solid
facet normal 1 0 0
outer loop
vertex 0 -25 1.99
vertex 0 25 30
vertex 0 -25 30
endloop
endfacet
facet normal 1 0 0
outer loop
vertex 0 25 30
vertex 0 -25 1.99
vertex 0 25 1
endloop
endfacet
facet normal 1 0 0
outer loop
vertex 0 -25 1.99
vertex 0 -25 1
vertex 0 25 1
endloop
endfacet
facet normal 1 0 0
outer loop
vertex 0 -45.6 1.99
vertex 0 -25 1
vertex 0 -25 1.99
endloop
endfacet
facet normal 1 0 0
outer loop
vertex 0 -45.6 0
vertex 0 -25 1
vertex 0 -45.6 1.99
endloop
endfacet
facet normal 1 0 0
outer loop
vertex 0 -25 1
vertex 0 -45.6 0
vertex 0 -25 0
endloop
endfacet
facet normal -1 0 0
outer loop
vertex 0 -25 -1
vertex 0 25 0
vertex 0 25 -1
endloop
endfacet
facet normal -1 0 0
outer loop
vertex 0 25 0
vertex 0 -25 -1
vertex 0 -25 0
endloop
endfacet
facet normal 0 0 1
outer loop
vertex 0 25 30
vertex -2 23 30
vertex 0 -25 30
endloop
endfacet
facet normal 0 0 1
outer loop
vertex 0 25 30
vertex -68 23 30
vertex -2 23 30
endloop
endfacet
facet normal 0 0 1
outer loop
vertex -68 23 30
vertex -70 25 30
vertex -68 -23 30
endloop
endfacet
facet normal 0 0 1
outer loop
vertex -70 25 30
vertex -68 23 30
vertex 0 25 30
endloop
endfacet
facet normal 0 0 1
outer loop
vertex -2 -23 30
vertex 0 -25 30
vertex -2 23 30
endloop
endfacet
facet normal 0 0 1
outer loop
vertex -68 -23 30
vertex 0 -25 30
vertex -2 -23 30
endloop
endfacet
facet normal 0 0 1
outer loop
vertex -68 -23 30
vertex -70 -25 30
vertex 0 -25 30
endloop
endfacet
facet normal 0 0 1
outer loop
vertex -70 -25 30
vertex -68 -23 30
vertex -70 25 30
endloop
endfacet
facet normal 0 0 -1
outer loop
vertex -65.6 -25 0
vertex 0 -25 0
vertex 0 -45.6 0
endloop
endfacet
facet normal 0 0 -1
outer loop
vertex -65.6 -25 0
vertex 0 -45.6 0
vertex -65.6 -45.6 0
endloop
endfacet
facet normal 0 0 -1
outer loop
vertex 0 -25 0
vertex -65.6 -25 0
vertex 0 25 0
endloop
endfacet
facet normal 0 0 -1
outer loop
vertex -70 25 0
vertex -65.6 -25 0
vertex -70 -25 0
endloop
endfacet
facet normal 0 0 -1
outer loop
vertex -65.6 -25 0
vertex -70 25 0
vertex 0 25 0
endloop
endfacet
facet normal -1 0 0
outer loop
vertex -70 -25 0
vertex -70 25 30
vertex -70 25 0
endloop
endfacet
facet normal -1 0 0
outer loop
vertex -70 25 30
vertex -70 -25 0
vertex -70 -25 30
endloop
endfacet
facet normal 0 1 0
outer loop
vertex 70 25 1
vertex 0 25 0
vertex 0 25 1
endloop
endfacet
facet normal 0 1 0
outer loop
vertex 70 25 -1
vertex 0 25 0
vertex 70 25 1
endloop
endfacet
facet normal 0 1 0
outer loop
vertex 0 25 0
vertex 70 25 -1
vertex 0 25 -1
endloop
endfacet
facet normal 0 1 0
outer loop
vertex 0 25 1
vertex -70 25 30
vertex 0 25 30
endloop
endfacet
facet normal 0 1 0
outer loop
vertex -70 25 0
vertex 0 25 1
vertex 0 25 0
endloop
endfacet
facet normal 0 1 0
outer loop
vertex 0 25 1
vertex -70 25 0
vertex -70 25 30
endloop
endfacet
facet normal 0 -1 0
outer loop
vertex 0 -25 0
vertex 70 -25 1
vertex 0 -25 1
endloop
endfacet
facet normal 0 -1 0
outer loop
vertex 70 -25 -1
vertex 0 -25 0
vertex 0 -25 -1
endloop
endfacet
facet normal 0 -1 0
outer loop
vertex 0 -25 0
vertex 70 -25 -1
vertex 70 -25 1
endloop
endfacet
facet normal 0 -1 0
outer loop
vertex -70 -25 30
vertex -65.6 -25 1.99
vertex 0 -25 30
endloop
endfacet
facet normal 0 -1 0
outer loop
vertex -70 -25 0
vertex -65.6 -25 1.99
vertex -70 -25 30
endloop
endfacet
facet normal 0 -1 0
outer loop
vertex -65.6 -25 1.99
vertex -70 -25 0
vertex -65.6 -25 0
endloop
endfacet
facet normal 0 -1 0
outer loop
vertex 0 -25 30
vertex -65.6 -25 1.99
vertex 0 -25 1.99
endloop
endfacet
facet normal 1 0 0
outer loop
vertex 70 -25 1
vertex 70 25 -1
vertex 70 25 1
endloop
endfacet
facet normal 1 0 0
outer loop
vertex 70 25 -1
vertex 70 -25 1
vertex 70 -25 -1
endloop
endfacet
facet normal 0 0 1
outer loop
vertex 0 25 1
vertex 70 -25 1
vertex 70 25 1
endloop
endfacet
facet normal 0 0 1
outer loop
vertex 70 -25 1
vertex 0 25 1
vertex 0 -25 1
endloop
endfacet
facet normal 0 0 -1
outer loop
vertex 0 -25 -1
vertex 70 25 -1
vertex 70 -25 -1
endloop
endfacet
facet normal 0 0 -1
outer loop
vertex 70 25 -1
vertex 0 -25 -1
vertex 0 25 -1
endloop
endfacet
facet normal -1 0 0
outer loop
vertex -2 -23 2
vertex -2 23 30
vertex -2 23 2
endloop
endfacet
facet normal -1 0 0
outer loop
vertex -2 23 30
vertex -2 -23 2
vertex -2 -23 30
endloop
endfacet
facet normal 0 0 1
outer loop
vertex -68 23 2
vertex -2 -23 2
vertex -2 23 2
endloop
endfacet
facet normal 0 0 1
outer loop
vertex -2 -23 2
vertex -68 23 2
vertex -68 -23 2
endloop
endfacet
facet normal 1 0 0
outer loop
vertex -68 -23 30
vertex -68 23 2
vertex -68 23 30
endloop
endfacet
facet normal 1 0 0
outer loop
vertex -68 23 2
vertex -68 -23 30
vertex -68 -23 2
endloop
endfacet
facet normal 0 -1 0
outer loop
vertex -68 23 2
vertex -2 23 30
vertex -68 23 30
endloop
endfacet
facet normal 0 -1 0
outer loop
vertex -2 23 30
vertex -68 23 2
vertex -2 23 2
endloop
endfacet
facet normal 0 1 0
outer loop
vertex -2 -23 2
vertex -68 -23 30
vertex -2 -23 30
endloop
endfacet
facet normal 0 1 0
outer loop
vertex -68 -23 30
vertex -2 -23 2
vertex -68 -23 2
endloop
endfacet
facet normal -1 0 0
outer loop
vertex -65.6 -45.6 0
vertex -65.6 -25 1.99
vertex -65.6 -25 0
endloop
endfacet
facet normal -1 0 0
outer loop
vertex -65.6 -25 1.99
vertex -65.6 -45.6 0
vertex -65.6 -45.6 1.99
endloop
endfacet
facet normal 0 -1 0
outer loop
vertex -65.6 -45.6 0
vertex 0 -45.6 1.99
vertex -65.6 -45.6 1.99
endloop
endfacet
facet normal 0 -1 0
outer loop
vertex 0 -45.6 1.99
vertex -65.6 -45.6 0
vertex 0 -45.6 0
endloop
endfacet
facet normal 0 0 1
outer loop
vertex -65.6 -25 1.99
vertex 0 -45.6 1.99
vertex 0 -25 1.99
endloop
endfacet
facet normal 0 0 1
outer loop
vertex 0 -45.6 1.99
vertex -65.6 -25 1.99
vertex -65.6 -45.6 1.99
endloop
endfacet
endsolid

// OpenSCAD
// Built by bench/smallmodels/features/compiler.py from a list of features.
$fn = 64;
difference() {
  union() {
    translate([-35, 0, 0]) translate([-35, -25, 0]) cube([70, 50, 30]);
    translate([35, 0, -1]) translate([-35, -25, 0]) cube([70, 50, 2]);
  }
  translate([-68, -23, 2]) cube([66, 46, 29]);  // shell, wall 2, open top
}
difference() {
  union() {
    translate([-32.8, -22.8, 0]) translate([-32.8, -22.8, 0]) cube([65.6, 45.6, 4]);
    translate([35, 0, -1]) translate([-35, -25, 0]) cube([70, 50, 2]);
  }
  union() {
    translate([-32.8, -22.8, 1.99]) rotate([0, 0, 0]) translate([-32.8, -22.8, 0]) cube([65.6, 45.6, 2.02]);
  }
}
